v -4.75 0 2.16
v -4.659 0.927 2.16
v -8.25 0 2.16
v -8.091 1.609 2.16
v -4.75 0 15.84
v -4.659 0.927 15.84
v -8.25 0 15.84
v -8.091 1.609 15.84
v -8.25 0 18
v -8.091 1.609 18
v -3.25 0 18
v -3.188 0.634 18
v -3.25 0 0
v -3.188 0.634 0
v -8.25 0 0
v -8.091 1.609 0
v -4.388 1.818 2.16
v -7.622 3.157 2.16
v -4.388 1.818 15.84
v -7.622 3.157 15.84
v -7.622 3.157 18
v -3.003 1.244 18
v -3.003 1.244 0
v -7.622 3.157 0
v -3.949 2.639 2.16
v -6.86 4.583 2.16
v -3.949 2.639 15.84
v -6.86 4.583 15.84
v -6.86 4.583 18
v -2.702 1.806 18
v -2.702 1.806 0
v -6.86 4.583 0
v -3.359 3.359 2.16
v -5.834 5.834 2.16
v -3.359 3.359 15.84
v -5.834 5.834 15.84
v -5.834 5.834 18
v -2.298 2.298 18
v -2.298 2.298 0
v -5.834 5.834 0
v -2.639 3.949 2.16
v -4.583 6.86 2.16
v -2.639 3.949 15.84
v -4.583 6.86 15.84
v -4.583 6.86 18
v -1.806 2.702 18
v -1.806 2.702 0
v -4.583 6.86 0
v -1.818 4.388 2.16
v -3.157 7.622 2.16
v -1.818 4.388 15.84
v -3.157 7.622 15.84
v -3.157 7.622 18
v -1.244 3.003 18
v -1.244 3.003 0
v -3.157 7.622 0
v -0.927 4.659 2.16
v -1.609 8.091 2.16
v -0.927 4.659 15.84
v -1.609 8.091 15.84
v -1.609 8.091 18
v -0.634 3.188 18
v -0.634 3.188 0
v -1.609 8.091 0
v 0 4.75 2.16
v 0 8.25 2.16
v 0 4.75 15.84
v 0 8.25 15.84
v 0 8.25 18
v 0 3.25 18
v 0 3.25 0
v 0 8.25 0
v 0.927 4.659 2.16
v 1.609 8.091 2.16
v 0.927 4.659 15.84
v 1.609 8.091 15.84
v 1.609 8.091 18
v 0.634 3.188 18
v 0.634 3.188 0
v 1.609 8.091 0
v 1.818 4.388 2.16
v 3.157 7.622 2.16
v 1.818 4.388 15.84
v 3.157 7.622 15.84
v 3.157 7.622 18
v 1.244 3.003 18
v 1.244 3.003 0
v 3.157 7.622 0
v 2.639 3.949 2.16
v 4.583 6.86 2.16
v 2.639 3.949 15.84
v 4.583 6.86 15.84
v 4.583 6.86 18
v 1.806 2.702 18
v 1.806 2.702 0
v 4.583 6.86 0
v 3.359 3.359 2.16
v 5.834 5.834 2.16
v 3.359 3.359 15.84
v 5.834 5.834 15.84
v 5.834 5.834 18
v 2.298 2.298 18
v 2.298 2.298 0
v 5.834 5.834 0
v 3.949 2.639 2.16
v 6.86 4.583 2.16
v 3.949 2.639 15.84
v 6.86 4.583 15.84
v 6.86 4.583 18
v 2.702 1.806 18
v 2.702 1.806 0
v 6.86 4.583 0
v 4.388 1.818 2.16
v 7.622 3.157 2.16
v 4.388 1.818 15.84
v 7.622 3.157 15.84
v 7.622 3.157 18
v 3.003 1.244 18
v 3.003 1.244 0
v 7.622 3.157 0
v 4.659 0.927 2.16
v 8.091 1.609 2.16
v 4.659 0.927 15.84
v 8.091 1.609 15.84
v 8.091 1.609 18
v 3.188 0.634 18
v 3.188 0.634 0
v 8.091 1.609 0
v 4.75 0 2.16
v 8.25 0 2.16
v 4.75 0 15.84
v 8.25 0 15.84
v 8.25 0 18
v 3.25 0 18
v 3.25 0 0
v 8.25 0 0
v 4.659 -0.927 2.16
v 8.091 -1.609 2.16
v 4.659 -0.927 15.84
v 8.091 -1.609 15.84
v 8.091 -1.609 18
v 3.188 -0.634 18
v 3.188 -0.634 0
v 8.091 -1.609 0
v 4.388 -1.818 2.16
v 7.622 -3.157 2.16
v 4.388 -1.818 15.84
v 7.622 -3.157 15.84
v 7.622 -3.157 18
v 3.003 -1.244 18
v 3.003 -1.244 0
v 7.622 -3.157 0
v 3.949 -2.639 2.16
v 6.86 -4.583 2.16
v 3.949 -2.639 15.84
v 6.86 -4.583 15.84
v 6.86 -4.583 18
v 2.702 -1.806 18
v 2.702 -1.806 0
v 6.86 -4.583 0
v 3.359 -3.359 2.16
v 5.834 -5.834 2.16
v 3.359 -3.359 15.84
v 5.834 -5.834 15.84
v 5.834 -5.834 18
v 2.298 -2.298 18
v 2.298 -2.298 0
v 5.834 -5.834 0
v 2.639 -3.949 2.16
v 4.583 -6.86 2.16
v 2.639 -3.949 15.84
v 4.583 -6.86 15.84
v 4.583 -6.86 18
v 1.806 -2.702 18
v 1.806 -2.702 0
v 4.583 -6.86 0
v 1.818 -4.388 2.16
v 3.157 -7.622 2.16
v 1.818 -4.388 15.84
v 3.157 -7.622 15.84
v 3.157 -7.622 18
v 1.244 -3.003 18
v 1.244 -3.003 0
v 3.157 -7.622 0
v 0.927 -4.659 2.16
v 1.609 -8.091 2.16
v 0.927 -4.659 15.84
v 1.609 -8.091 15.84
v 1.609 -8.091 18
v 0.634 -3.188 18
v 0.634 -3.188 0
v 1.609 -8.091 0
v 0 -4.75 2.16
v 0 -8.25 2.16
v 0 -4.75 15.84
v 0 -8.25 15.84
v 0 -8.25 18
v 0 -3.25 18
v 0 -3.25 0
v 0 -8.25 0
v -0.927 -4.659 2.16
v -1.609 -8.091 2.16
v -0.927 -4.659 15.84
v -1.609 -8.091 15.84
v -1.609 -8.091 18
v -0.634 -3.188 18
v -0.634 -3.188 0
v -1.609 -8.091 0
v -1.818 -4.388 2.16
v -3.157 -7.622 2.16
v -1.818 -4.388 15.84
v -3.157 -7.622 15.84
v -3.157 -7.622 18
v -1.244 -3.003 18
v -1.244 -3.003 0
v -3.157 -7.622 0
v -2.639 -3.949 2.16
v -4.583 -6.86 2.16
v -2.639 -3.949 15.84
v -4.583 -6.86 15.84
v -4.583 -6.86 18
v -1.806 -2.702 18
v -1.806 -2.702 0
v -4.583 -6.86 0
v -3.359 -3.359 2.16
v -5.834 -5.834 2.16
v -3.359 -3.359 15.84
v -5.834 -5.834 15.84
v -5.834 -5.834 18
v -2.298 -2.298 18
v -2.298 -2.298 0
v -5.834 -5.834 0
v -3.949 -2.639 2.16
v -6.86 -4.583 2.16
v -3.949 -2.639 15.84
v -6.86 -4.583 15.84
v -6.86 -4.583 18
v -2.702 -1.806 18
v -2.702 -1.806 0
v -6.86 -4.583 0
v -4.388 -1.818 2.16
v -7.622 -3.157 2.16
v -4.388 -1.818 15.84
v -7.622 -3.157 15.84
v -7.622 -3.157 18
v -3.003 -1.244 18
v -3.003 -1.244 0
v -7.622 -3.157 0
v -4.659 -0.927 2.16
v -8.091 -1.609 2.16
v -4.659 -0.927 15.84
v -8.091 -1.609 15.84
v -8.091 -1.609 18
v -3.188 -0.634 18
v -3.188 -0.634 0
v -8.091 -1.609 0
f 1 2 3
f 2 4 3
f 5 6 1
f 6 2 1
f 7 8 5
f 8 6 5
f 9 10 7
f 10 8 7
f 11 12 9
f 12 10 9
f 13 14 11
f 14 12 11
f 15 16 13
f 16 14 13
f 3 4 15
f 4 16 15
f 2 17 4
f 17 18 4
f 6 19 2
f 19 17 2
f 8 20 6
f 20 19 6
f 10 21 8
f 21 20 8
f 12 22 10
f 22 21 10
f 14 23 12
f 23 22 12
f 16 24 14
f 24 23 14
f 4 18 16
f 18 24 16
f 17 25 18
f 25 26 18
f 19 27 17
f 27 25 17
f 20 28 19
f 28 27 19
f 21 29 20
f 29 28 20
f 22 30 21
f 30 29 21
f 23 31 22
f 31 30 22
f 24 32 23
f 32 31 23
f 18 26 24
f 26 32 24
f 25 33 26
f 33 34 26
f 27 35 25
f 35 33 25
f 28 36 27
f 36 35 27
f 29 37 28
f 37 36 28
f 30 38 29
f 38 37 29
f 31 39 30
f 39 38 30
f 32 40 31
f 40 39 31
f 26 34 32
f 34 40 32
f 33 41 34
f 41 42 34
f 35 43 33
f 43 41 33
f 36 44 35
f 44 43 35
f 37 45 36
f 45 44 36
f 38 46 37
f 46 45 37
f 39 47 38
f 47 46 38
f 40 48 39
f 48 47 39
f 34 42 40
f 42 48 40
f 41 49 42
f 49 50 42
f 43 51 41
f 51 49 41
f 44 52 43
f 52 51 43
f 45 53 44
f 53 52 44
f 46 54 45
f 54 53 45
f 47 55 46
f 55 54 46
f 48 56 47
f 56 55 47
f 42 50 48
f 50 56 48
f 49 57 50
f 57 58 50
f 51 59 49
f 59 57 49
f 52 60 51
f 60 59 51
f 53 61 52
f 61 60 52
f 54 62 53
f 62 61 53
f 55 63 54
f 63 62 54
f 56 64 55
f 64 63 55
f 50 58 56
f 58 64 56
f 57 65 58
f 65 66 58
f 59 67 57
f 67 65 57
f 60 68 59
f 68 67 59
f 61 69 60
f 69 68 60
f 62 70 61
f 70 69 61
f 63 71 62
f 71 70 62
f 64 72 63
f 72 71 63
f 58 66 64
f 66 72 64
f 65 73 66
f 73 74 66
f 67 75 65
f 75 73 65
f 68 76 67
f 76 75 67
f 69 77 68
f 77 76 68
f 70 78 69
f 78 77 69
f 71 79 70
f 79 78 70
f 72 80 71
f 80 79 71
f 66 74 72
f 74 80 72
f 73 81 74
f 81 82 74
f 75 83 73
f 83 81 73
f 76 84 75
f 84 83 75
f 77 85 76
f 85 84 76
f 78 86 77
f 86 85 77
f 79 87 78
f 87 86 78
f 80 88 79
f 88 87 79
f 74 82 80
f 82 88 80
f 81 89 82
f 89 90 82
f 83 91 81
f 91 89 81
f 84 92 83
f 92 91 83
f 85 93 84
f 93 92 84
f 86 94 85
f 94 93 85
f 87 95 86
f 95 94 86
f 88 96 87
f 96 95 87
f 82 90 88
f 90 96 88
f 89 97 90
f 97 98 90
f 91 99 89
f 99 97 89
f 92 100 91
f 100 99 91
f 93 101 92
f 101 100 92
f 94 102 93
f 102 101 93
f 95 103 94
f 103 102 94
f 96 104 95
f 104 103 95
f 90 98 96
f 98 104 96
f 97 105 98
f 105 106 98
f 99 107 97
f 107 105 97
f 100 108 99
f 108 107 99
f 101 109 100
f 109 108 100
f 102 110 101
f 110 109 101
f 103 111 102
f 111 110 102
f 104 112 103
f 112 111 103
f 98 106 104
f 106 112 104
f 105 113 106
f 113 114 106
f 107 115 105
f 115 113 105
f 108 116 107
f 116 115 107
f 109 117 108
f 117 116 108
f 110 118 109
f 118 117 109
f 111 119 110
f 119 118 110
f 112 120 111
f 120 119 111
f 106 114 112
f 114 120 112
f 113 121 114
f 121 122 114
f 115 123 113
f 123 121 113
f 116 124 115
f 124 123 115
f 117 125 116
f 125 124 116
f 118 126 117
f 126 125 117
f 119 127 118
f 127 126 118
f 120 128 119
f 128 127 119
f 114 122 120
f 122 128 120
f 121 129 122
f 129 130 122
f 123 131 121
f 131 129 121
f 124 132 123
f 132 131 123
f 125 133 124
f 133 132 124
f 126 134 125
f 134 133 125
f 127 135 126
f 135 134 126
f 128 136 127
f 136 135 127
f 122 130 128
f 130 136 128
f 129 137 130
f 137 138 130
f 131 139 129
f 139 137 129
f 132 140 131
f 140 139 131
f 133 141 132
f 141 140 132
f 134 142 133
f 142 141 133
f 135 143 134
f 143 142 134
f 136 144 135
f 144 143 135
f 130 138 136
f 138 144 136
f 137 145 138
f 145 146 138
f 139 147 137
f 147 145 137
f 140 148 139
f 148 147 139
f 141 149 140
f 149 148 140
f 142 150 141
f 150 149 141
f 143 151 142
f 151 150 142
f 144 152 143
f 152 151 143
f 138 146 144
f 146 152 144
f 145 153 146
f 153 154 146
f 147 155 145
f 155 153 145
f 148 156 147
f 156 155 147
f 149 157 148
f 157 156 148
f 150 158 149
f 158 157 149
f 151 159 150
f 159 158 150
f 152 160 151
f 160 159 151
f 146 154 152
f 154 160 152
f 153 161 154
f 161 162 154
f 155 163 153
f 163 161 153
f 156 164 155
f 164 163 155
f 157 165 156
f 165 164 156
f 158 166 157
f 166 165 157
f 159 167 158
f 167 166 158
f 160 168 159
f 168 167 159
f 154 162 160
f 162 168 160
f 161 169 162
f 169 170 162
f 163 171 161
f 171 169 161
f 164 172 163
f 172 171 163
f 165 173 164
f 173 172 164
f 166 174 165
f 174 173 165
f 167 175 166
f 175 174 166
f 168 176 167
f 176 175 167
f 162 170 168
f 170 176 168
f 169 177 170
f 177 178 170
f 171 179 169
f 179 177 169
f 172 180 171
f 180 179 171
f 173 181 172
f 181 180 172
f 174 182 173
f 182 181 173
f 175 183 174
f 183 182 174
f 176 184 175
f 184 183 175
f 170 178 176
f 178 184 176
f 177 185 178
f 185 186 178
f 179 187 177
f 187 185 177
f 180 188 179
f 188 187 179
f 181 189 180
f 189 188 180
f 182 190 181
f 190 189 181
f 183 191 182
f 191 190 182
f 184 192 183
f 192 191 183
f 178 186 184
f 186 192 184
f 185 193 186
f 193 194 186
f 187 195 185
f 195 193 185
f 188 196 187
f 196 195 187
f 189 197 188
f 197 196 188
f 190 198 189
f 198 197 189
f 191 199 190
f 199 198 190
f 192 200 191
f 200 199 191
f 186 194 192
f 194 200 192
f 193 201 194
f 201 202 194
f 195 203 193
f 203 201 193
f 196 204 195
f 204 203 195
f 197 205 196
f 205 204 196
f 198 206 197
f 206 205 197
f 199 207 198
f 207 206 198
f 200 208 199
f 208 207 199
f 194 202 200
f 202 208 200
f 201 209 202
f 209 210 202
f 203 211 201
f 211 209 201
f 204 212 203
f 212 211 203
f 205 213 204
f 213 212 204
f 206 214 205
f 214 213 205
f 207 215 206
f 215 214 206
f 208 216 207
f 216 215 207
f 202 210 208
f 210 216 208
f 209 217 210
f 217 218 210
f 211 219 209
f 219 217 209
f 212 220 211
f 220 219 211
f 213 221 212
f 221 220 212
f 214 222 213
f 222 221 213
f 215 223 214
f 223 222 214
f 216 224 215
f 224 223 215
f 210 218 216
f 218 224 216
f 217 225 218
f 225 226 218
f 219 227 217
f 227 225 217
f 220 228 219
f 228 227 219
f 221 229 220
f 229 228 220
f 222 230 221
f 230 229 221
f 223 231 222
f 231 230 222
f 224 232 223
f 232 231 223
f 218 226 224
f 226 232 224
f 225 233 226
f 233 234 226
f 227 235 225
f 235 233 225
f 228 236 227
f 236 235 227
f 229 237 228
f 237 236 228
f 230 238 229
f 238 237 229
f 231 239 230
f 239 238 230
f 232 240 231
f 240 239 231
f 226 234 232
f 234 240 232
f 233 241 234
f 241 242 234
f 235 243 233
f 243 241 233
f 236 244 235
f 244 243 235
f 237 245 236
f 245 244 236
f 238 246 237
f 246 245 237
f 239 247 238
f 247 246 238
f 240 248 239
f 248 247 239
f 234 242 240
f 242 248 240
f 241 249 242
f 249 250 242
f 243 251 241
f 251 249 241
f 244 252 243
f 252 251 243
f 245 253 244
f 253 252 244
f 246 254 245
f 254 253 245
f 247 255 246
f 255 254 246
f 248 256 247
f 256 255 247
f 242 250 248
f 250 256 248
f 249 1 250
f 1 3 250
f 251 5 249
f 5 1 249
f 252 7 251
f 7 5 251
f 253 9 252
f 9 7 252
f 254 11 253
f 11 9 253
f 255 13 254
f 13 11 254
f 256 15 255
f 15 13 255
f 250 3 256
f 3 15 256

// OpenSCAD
$fn = 32;

// ----------------------------------------------------------------------
// Profiled standoff: spool spacer, 18 mm long, bore 6.5 mm
// ----------------------------------------------------------------------

// --- parameters (mm) ---
revolve_angle = 360;      // full turn around the Z axis
profile_points = 8;       // points of the closed outline

profile = [[3.25, 0], [8.25, 0], [8.25, 2.16], [4.75, 2.16], [4.75, 15.84], [8.25, 15.84], [8.25, 18], [3.25, 18]];  // single closed polygon, 8 points, counter clockwise

// --- the one profile operation ---
rotate_extrude(angle = revolve_angle) polygon(points = profile);
